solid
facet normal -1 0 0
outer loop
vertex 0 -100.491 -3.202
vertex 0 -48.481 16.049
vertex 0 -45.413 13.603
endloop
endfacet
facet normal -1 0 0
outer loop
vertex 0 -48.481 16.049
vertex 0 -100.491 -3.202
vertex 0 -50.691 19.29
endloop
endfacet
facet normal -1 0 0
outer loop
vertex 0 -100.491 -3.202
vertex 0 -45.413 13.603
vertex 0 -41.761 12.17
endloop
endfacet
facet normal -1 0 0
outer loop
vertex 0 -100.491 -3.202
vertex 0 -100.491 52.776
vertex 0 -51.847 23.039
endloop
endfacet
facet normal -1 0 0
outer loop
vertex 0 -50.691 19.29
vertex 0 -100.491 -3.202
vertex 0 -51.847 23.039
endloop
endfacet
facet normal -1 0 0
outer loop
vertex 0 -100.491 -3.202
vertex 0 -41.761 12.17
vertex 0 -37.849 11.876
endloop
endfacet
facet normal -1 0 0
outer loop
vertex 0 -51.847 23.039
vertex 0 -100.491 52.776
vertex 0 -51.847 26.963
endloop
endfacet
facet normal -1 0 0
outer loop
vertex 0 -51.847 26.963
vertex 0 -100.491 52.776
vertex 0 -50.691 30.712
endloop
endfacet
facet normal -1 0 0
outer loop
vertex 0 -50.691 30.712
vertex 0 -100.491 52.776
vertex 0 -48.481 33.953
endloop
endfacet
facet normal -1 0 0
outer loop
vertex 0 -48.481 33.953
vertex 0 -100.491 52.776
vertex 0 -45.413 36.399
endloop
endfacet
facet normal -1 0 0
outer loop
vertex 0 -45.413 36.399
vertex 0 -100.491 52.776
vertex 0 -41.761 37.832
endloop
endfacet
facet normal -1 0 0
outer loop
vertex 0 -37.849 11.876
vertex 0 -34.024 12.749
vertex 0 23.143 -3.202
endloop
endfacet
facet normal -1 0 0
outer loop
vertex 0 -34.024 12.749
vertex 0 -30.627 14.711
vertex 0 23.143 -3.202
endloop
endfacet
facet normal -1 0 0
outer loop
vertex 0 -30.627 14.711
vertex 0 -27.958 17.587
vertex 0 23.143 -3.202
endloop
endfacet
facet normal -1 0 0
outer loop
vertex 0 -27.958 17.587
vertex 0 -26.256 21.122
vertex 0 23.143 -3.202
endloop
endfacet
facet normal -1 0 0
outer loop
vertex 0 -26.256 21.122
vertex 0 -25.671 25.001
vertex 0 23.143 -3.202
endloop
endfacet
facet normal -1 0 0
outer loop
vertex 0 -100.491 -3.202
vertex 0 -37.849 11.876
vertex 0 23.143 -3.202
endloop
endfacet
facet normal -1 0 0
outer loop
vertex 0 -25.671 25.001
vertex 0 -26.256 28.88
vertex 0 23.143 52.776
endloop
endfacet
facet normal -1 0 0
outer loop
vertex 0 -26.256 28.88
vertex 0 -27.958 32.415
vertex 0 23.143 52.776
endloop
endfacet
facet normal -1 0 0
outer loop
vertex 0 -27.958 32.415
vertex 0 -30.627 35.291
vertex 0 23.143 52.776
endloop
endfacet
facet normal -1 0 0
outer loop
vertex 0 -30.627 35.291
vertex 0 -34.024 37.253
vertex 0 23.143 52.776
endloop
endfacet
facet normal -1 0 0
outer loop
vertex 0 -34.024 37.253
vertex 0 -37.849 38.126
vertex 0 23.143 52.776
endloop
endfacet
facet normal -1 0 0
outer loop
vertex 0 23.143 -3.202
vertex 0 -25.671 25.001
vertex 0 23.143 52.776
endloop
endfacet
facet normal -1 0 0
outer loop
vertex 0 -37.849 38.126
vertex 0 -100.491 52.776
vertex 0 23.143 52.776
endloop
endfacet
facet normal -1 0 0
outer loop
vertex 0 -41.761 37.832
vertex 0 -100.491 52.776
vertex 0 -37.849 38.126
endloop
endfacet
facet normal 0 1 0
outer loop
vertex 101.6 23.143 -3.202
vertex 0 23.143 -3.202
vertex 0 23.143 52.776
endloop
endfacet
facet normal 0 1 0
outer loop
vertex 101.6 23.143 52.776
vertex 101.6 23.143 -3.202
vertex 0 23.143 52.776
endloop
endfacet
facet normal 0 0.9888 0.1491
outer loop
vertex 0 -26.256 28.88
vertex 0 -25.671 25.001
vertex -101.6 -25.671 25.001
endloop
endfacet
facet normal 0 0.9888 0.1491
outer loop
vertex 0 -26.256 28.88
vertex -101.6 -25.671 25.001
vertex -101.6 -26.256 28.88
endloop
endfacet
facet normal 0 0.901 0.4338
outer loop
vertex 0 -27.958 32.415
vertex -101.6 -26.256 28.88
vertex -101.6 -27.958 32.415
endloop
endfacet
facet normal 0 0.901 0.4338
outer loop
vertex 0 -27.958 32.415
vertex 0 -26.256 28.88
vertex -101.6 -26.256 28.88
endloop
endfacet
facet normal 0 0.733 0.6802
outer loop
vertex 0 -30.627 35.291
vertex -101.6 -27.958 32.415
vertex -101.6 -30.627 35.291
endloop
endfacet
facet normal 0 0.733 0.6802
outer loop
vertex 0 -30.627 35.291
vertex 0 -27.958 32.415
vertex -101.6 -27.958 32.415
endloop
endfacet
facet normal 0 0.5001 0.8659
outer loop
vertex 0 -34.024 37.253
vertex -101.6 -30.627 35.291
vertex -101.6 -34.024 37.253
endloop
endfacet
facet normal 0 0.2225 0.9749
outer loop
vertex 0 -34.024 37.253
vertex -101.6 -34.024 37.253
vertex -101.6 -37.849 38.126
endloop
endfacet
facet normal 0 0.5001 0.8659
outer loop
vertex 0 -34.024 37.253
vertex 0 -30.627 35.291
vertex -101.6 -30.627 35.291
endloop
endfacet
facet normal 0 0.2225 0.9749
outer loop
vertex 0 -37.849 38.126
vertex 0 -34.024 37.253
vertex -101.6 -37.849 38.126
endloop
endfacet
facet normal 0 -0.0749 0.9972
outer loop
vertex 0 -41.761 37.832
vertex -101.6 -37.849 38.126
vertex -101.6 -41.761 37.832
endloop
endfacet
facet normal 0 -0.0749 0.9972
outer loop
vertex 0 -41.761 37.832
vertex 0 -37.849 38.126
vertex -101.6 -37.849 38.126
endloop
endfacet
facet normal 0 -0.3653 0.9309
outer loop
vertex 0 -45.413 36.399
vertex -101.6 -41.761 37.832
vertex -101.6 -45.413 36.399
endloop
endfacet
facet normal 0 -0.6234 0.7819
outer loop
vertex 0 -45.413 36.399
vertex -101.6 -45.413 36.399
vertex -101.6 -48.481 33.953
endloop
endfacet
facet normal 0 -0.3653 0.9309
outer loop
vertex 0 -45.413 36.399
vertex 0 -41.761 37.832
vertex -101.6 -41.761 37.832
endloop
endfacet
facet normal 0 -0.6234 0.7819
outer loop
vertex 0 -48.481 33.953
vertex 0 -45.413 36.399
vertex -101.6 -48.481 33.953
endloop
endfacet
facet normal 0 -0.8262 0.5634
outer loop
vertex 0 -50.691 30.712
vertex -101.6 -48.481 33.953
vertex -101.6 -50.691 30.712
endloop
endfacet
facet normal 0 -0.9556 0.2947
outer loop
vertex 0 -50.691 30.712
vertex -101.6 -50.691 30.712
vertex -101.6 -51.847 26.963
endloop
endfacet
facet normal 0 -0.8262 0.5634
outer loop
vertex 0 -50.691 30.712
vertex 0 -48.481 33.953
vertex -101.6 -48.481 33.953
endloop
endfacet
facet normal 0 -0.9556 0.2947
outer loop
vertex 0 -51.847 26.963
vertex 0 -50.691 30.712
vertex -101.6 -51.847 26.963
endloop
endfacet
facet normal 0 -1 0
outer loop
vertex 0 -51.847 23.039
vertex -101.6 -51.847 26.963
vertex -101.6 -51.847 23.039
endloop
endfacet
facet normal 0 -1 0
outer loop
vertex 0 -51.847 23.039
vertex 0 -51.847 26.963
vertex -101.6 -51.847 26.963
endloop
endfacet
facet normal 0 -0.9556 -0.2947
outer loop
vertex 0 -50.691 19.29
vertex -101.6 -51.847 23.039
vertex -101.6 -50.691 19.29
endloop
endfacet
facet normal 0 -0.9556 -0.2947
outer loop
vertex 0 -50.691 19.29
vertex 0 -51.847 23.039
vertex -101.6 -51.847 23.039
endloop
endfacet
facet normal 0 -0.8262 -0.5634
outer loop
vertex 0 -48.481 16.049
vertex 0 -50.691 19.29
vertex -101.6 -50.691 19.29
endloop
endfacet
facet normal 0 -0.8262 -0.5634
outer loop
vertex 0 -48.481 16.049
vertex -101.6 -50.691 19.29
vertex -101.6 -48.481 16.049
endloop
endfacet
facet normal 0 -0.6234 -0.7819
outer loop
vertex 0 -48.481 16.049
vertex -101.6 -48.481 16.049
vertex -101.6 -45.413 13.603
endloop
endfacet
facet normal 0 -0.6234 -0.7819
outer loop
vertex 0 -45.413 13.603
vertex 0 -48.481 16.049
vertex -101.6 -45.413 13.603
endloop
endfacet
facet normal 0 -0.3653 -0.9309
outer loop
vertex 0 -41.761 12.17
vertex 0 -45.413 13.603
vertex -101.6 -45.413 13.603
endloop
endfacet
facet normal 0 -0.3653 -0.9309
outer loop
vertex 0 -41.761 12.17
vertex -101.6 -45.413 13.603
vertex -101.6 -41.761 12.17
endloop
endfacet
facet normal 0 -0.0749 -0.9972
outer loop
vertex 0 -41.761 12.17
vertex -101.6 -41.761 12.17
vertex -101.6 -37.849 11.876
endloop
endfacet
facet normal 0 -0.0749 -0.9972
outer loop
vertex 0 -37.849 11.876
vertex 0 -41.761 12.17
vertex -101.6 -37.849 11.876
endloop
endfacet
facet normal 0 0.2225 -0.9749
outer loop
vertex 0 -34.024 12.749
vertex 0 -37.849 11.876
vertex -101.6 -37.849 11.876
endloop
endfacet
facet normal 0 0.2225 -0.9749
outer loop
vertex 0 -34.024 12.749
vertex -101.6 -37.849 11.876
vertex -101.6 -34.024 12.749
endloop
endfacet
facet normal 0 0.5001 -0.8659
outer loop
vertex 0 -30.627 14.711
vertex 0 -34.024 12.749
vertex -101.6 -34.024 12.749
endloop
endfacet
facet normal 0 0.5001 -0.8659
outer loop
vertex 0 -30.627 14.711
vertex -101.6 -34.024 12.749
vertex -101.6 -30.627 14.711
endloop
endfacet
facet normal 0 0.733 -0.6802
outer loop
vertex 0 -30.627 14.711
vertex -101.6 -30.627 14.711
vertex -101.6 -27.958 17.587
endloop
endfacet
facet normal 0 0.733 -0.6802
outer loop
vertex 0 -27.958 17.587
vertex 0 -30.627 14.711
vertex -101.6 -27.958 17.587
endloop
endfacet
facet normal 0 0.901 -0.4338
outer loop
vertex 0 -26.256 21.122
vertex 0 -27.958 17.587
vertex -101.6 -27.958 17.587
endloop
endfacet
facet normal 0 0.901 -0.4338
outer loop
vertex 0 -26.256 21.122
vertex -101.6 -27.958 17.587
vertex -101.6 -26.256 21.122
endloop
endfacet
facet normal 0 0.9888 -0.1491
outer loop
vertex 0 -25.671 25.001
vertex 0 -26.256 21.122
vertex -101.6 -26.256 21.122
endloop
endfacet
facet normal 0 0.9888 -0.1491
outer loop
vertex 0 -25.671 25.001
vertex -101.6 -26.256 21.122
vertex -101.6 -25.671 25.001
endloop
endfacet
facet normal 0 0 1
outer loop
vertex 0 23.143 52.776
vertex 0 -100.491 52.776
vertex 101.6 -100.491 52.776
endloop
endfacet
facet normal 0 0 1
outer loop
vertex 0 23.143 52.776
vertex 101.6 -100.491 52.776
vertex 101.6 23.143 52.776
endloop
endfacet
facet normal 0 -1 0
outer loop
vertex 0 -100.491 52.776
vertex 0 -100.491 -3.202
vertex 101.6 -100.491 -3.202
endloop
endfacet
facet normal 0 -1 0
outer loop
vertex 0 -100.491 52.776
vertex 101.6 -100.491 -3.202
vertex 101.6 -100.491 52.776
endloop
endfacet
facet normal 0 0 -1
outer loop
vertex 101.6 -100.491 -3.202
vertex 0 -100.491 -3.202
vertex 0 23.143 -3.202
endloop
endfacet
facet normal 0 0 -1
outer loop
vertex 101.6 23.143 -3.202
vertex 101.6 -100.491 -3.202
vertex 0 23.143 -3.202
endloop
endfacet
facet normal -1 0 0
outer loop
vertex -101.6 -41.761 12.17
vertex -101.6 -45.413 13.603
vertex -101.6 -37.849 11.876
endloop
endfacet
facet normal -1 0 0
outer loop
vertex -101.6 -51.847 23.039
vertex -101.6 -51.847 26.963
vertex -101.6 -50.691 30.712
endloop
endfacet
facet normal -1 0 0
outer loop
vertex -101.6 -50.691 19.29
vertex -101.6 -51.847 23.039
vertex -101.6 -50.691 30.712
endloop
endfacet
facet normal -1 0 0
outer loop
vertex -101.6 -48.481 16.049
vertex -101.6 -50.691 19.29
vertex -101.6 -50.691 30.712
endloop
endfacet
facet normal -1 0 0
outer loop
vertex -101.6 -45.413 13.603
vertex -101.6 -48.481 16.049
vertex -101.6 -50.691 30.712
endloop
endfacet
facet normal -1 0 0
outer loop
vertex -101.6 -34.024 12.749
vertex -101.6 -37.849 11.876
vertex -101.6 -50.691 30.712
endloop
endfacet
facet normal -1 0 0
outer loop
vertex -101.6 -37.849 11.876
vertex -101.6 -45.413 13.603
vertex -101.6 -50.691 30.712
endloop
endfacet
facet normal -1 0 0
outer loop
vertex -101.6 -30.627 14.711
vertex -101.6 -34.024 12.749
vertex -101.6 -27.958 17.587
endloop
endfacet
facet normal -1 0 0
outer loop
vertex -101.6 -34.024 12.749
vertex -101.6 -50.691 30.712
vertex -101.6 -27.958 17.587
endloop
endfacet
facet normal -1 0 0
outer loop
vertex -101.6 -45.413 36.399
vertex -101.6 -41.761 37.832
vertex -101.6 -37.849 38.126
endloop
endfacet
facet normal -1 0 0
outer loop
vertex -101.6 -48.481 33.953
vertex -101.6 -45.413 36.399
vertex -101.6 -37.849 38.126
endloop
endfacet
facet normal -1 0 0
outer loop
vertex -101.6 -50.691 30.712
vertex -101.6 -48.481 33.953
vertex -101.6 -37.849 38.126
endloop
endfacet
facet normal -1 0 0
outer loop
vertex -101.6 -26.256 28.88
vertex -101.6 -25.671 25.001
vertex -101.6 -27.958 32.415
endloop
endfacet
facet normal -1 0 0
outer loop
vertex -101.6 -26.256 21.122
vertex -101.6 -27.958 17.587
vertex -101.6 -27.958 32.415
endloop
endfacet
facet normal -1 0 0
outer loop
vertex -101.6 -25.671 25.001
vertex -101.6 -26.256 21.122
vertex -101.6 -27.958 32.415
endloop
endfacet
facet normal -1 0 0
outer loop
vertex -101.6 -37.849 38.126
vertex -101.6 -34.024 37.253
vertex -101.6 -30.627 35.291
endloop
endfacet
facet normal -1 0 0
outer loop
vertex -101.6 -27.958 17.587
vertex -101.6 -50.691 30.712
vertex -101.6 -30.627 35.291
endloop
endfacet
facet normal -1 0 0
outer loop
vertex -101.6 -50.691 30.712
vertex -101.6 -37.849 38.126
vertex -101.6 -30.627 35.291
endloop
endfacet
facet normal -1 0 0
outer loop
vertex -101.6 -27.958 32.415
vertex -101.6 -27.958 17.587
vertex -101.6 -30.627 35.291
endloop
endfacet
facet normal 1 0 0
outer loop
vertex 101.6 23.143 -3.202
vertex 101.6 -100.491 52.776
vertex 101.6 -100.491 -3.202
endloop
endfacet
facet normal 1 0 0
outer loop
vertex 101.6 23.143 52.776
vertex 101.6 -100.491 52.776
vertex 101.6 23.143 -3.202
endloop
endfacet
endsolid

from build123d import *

# Parameters (mm, degrees)
F0_W          = 123.634026
F0_H          = 55.977793
F1_DEPTH      = 101.6
F2_R          = 13.161447
F3_DEPTH      = 203.2
F3_DEPTH_BACK = 25.4


with BuildPart() as f1:
    # F0 (on Right) → F1 (new body)
    with BuildSketch(Plane.YZ):
        with Locations((-38.673699, 24.787056)):
            Rectangle(F0_W, F0_H)
    extrude(amount=F1_DEPTH)

    # F2 (on face) → F3 (join, two sides)
    with BuildSketch(Plane.YZ.offset(101.6)) as f3_sk:
        with Locations((-38.832705, 25.00103)):
            Circle(F2_R)
    extrude(amount=-F3_DEPTH)
    extrude(f3_sk.sketch, amount=-F3_DEPTH_BACK)


solid = f1.part
